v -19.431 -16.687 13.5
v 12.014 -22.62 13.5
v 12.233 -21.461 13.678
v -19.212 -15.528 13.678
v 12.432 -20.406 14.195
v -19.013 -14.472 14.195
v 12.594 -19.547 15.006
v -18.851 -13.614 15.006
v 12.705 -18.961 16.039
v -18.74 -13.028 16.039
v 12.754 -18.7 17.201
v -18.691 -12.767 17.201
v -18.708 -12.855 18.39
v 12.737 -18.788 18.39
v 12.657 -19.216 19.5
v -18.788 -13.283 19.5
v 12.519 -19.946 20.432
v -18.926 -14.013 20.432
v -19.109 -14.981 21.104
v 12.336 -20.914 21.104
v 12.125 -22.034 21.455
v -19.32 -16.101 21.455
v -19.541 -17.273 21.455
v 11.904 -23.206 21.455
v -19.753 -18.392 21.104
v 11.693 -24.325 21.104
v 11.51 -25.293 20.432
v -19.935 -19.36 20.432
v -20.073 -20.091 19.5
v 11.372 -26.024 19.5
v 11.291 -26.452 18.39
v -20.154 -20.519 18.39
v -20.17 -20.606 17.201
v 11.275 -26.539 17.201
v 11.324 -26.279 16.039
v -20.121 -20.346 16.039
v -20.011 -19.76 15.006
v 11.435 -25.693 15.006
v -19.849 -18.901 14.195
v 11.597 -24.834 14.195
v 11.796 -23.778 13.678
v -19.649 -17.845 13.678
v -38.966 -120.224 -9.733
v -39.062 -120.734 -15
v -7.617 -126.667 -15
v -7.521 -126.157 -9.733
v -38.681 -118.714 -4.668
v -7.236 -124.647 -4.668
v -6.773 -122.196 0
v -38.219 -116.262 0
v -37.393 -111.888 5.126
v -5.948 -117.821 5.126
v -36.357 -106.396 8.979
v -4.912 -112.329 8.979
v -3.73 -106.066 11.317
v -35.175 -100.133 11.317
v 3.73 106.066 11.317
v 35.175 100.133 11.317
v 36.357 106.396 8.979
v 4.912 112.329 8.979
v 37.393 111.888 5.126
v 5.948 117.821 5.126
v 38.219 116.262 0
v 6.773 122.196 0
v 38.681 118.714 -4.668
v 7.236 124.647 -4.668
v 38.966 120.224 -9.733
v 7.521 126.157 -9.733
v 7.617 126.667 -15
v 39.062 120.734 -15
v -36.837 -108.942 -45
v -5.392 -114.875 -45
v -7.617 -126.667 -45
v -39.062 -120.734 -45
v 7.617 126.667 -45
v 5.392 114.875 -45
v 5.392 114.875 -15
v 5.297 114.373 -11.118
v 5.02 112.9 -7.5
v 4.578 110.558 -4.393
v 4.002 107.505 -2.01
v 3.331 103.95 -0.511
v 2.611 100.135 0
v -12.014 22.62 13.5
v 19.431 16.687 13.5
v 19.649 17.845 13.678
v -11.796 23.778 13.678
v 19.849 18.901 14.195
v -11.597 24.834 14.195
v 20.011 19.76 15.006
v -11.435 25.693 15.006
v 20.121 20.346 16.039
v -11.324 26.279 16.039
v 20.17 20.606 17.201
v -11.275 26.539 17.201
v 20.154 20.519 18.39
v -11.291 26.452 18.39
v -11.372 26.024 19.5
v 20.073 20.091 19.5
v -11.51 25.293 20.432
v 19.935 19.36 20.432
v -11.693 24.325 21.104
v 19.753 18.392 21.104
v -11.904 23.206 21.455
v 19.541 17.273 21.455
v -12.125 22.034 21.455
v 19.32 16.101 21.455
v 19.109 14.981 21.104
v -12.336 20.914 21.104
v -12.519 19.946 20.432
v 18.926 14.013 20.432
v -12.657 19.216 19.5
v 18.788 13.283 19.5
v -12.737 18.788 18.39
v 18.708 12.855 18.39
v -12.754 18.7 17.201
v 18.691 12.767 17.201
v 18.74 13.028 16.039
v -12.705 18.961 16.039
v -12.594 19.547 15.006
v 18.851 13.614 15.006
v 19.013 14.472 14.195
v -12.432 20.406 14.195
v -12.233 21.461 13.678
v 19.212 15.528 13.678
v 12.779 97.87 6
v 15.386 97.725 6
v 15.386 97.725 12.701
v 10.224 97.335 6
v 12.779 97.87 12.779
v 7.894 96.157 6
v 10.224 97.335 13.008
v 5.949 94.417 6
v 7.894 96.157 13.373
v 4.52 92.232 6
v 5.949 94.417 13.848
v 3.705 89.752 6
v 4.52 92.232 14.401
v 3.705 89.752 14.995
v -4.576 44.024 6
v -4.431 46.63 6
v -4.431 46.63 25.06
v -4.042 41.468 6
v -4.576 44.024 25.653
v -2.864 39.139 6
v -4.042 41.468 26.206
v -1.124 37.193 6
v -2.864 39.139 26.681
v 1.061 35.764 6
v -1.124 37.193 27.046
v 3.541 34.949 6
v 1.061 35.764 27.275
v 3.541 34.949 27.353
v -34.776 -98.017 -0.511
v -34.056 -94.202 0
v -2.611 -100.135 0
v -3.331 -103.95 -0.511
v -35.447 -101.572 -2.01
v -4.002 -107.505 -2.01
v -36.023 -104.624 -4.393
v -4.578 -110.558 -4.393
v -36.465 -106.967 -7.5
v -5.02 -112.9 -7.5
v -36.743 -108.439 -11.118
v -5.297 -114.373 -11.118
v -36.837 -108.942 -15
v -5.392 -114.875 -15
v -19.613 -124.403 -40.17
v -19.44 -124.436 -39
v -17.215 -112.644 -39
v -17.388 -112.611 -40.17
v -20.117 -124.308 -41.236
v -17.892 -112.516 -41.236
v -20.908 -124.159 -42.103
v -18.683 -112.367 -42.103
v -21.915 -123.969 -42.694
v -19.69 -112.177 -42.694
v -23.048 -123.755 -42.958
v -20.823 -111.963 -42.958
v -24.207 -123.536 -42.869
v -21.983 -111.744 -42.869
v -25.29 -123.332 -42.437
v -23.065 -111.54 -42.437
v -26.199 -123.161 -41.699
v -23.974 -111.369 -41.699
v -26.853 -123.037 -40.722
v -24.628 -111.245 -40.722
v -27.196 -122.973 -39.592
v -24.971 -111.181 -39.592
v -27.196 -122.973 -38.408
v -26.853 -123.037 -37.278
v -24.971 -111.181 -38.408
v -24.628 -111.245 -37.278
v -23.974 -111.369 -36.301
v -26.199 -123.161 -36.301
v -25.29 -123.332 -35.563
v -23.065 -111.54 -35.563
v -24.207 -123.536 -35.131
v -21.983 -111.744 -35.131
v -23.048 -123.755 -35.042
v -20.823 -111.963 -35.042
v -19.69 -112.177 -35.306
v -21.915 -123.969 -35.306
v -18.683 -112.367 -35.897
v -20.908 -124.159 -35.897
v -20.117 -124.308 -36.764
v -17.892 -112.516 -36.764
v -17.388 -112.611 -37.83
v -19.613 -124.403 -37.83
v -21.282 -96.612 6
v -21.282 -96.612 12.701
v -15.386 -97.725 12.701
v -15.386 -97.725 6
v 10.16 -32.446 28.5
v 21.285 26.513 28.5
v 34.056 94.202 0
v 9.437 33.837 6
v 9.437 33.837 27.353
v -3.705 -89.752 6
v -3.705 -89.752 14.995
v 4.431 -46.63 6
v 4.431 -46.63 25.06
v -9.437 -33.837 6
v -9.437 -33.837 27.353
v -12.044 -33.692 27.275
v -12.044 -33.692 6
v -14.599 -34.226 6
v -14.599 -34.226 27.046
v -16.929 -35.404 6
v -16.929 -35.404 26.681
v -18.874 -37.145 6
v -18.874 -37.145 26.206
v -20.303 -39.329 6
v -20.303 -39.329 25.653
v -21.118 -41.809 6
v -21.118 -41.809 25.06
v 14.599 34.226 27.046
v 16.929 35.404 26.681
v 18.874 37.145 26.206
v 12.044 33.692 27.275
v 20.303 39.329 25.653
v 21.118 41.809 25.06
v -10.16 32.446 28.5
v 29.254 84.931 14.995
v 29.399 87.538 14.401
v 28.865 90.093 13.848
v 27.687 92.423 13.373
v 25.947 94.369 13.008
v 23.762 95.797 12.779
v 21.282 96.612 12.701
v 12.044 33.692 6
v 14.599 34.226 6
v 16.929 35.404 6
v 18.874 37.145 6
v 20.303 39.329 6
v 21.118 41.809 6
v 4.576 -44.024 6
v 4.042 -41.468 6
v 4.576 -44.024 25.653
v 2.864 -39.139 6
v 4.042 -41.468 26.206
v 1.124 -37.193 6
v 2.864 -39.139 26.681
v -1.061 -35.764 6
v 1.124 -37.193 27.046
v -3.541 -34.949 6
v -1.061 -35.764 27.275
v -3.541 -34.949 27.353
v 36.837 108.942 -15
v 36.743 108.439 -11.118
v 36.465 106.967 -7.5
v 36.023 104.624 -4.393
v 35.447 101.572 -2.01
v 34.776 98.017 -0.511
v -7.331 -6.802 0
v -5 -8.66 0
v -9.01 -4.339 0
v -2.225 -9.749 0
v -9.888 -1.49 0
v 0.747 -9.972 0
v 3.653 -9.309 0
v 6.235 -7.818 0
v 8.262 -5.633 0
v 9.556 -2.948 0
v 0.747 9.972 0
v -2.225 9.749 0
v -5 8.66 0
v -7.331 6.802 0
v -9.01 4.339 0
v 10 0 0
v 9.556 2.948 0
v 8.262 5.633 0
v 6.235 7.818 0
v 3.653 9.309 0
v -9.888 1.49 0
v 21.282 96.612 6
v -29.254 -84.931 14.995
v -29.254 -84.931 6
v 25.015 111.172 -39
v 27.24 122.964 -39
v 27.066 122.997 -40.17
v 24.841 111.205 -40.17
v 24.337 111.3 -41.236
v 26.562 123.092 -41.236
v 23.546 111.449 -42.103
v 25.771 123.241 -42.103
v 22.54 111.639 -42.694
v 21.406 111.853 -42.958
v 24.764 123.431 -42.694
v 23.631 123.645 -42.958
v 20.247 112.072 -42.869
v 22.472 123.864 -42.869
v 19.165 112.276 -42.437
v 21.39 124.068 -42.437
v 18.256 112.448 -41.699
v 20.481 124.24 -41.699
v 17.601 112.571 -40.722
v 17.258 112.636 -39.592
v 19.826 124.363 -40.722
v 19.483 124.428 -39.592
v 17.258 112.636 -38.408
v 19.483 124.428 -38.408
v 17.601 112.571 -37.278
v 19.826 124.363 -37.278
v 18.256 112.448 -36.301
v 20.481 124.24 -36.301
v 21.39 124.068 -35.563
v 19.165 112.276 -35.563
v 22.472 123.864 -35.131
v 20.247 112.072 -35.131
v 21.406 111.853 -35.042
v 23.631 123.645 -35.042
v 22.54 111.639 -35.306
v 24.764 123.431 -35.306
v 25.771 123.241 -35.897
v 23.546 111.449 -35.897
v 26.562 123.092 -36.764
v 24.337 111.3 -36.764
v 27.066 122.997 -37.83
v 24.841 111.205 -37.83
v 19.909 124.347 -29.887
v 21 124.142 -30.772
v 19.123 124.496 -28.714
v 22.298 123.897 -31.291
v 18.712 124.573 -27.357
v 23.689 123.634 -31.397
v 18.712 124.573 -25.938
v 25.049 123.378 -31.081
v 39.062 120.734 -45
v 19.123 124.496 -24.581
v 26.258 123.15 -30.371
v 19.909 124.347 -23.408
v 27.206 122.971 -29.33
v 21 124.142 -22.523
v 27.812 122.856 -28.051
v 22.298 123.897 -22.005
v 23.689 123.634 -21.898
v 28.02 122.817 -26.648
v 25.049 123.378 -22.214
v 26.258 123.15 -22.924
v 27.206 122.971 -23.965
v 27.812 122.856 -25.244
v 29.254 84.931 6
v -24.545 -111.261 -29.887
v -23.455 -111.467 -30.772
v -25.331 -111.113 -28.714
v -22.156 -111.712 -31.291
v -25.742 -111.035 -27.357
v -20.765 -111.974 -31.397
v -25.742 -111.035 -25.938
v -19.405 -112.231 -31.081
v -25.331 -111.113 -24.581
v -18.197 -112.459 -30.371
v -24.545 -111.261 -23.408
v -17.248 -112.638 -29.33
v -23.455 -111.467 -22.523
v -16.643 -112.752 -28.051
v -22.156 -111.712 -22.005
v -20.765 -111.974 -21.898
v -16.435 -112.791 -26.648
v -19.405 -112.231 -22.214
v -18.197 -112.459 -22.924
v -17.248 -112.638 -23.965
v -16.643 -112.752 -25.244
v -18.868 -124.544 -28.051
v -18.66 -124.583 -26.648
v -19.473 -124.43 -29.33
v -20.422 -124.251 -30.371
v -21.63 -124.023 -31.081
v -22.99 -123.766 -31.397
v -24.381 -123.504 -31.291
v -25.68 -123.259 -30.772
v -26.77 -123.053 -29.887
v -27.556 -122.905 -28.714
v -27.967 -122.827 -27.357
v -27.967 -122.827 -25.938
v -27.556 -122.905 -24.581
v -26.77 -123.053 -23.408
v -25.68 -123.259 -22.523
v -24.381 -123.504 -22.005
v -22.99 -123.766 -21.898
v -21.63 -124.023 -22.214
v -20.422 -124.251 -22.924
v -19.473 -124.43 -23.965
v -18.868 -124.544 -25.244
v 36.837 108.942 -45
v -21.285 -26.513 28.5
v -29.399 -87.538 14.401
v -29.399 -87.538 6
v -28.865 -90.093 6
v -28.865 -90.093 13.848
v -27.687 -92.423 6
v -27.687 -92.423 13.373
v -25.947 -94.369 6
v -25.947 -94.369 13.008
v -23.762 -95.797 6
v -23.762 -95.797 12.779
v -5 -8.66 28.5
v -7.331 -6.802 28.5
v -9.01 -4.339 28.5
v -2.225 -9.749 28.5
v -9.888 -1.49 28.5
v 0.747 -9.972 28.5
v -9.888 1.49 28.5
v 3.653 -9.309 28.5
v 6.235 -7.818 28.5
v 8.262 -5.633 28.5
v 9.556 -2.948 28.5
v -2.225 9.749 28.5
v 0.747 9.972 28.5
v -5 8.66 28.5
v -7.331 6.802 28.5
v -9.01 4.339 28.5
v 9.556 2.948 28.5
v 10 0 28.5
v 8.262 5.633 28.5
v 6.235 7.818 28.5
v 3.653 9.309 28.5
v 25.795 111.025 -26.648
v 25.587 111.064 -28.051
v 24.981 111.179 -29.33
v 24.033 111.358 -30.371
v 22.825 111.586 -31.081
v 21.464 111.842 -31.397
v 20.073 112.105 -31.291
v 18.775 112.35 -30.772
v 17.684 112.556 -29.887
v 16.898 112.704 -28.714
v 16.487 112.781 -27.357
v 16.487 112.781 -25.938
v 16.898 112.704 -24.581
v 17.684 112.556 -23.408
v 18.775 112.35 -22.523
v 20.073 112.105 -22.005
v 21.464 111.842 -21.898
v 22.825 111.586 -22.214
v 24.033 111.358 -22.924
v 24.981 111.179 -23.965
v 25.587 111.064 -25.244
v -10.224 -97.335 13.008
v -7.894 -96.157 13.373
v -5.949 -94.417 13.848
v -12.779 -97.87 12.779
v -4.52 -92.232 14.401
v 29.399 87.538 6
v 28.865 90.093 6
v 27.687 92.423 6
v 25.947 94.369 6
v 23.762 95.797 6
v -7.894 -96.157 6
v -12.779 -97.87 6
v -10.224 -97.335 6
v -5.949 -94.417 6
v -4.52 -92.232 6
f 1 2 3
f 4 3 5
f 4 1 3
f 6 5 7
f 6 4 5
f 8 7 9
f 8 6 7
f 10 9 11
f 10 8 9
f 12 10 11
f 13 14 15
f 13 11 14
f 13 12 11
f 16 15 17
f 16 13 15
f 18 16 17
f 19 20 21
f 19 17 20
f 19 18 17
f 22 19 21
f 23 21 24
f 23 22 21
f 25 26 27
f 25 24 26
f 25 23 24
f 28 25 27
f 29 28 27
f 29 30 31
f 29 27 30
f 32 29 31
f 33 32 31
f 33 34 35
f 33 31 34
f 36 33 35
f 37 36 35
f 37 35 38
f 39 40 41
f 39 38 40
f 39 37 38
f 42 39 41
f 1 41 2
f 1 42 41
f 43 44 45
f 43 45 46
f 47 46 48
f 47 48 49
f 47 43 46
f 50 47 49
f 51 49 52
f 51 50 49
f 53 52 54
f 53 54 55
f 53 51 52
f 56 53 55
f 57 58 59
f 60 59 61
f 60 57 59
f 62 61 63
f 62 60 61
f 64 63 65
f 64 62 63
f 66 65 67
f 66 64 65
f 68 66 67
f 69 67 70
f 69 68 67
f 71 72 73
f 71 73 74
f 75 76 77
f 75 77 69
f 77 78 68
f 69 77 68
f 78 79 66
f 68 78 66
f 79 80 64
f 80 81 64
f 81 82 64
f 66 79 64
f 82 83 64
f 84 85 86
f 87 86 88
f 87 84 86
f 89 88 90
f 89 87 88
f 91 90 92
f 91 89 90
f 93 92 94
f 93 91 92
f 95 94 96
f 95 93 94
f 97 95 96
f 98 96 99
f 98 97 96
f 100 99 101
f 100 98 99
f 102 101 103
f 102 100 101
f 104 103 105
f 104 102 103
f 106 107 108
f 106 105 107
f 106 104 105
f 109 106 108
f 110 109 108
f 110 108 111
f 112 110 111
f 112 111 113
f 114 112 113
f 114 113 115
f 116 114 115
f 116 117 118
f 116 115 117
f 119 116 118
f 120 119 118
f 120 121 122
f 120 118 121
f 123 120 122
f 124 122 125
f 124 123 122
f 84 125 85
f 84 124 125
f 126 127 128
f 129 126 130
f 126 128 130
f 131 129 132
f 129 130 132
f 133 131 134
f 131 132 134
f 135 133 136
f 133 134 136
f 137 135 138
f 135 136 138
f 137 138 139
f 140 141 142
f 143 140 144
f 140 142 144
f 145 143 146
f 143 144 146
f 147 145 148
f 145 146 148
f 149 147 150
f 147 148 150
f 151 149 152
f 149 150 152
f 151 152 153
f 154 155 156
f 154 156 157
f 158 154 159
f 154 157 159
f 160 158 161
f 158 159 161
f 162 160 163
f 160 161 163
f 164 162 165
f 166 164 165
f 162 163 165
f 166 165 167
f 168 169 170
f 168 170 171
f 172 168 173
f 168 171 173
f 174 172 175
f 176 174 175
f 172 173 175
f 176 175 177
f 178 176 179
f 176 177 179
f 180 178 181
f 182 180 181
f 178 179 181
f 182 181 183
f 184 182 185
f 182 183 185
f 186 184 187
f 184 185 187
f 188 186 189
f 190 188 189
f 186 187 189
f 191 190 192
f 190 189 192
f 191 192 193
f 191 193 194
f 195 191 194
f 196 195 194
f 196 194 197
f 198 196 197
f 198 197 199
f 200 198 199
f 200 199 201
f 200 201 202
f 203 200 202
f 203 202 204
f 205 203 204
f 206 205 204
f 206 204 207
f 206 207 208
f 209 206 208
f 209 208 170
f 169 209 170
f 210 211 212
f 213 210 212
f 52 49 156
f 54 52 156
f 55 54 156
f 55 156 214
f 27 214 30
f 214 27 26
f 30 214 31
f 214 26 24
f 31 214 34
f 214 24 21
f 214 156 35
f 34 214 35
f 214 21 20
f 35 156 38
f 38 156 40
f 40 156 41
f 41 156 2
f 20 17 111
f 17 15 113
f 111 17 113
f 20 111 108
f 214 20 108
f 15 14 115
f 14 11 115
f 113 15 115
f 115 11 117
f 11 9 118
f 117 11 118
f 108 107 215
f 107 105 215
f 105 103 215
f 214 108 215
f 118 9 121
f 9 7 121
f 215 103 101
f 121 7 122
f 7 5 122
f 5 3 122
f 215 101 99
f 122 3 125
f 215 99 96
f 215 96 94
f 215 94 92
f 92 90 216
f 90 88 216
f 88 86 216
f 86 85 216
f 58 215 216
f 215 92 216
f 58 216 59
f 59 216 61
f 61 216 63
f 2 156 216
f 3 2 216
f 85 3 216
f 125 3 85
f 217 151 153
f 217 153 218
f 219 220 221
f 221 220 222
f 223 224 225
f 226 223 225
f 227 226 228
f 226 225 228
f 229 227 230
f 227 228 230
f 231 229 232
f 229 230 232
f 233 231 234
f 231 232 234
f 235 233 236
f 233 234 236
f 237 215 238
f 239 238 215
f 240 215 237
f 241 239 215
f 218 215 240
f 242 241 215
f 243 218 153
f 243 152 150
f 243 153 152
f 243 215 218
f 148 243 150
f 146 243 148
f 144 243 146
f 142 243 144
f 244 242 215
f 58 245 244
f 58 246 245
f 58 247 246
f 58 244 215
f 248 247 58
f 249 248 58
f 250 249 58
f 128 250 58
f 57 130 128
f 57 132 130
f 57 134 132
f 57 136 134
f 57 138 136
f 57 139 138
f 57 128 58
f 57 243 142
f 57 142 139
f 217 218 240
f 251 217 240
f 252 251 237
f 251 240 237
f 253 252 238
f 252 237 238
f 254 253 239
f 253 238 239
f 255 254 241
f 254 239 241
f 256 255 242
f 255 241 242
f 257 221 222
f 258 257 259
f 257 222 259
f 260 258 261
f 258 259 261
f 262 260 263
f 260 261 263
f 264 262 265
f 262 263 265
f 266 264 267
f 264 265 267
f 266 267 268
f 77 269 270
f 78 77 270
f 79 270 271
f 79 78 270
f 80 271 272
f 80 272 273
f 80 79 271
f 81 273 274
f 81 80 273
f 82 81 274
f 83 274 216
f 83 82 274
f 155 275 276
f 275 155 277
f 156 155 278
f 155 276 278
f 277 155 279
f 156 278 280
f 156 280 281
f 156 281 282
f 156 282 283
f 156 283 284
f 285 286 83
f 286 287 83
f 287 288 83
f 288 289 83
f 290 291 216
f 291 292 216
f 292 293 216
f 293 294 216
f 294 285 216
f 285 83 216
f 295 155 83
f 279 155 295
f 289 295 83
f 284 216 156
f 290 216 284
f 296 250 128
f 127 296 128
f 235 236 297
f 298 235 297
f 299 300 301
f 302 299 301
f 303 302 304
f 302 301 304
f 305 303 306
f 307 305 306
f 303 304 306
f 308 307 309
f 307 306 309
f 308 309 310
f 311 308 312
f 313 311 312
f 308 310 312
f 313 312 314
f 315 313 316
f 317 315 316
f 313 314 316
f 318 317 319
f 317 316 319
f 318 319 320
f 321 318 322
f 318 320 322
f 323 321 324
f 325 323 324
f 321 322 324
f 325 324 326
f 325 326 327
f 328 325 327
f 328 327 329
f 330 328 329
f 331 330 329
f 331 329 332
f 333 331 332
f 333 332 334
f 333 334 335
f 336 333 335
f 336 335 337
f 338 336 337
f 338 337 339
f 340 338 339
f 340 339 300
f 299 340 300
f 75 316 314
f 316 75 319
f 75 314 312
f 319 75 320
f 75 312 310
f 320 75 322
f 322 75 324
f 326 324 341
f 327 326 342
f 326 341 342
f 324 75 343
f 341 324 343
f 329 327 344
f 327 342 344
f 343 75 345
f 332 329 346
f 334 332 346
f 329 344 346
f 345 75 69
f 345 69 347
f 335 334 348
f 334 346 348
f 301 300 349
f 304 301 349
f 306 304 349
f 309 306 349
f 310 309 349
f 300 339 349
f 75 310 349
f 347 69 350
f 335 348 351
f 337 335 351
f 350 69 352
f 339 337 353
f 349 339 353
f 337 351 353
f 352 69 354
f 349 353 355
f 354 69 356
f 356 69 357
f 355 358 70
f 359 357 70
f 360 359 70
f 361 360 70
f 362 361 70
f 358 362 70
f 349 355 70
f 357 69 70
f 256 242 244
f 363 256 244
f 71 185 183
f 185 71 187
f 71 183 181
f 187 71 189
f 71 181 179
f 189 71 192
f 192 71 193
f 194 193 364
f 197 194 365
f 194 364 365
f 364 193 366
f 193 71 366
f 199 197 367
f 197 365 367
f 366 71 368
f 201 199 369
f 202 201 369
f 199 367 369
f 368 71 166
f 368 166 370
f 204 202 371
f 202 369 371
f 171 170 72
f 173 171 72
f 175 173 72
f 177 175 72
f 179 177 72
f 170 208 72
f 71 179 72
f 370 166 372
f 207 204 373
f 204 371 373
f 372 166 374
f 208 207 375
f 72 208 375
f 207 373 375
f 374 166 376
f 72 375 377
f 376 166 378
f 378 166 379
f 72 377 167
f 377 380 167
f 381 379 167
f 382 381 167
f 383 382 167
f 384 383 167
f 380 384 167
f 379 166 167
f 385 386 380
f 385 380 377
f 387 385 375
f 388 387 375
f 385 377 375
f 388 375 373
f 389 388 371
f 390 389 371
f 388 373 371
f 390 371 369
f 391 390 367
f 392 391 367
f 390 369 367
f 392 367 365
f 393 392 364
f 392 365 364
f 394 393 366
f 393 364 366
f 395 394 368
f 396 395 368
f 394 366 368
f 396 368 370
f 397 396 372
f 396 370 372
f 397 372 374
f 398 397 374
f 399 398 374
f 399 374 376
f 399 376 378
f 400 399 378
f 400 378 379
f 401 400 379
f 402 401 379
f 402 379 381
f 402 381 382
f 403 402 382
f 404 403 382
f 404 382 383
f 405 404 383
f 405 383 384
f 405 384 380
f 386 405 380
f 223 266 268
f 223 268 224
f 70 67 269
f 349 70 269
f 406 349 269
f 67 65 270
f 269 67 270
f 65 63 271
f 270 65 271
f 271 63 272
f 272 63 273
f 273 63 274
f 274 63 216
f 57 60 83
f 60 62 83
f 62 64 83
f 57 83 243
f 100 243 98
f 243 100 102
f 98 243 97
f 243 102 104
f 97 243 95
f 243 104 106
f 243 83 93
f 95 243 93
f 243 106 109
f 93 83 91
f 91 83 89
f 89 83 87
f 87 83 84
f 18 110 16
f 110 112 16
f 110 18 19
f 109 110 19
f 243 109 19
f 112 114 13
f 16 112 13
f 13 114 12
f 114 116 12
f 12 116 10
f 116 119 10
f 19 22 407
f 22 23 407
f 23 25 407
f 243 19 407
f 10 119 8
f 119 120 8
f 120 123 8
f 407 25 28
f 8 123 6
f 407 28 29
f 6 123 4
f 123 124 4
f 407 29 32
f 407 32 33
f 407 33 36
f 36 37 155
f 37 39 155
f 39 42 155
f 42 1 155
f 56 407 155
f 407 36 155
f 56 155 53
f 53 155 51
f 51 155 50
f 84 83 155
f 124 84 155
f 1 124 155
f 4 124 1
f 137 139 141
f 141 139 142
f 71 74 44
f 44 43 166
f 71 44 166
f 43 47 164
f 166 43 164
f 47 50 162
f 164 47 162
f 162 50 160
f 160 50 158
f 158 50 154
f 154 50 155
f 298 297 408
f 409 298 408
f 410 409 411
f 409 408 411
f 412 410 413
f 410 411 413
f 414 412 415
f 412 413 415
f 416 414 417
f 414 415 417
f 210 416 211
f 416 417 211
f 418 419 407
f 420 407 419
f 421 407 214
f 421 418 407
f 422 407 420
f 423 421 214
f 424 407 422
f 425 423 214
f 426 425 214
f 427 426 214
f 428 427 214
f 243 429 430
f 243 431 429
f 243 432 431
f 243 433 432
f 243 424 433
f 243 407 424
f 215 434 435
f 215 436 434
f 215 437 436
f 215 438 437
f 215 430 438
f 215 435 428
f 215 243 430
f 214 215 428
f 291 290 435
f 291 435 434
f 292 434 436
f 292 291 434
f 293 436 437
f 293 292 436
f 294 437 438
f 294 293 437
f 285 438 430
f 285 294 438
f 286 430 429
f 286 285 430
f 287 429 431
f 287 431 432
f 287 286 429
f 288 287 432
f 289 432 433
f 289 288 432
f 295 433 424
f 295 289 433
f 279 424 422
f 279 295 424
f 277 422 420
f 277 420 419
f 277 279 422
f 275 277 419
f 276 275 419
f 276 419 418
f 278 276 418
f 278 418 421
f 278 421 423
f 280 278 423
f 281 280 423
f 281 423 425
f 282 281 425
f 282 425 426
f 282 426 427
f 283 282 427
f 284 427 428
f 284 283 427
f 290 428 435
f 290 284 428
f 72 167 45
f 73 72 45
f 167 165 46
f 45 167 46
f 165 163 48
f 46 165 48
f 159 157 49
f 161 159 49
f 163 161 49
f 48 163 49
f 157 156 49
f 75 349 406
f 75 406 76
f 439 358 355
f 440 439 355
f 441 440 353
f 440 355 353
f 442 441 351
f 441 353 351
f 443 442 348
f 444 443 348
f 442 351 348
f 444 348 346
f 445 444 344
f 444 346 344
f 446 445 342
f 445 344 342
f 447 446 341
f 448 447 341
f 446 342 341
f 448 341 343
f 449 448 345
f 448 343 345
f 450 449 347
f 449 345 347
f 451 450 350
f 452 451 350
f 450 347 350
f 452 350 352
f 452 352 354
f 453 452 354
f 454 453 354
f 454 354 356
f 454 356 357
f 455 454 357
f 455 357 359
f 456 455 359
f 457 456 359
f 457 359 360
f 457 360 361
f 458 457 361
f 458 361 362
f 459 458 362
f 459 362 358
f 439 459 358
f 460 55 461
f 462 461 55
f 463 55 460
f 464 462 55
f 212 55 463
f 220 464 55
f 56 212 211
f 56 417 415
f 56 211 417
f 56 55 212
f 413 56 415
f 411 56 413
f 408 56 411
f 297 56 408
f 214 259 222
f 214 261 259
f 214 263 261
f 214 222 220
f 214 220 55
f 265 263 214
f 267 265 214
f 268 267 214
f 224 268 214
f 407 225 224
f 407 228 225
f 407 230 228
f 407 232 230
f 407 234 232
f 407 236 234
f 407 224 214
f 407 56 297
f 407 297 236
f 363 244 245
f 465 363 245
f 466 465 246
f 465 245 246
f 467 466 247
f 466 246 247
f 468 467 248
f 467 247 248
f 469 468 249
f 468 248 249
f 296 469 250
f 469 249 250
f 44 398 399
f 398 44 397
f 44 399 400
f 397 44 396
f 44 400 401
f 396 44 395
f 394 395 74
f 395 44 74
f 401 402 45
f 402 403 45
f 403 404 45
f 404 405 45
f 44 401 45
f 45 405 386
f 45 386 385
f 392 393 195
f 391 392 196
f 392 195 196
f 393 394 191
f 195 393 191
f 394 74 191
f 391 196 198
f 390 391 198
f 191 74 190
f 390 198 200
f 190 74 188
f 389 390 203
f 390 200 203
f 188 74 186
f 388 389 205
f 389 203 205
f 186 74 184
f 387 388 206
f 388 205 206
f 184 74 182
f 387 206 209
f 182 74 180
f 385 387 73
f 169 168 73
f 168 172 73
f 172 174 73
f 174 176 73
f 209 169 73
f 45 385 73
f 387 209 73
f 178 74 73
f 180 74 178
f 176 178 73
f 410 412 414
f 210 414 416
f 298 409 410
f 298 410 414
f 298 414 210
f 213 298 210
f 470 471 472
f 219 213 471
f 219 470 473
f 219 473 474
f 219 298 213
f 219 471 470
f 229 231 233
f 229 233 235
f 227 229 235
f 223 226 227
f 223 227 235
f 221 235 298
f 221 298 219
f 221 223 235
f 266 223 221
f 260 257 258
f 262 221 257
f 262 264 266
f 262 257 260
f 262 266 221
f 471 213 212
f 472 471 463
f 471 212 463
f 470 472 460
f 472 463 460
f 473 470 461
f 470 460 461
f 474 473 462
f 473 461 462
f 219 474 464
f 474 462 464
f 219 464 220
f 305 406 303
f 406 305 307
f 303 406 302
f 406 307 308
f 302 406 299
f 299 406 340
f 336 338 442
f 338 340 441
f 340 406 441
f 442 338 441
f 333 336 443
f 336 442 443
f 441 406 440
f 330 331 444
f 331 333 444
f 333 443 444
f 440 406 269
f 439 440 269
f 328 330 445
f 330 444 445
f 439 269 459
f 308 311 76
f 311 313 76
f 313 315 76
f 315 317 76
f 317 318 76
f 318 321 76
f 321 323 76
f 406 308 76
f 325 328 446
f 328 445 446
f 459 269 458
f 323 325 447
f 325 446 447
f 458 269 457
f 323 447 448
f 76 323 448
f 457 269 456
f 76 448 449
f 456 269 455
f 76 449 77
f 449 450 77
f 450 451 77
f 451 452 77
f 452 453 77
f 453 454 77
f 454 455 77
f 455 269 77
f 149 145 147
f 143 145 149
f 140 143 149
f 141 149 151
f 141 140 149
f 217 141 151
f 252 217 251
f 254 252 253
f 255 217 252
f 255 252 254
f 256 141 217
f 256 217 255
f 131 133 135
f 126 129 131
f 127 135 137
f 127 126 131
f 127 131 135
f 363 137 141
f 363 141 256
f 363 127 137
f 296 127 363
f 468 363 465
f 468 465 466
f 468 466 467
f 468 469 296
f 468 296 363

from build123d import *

# Parameters (mm, degrees)
SKETCH1_R               = 10
BOSS_EXTRUDE1_DEPTH     = 28.5
BOSS_EXTRUDE2_DEPTH     = 45
SKETCH4_R               = 4.7625
SKETCH4_R_2             = 3.96875
CUT_EXTRUDE1_DEPTH      = 258.595725096
FILLET3_R               = 15
SKETCH10_R              = 4
CUT_EXTRUDE2_DEPTH      = 78.869968284
CUT_EXTRUDE2_DEPTH_BACK = 46.869968284
CUT_EXTRUDE4_DEPTH      = 22.5


with BuildPart() as part:
    # Sketch1 → Boss-Extrude1 (new body)
    with BuildSketch(Plane.XY):
        Polygon((-7.617068705, -126.66669812), (39.062241625, 120.733646626), (7.617068705, 126.66669812), (-39.062241625, -120.733646626), align=None)
        Circle(SKETCH1_R, mode=Mode.SUBTRACT)
    extrude(amount=BOSS_EXTRUDE1_DEPTH)

    # Sketch2 → Boss-Extrude2 (add)
    with BuildSketch(Plane(origin=(0, 0, 0), x_dir=(-1, 0, 0), z_dir=(0, 0, -1))):
        Polygon((-39.062241625, 120.733646626), (-36.837347314, 108.941706781), (-5.392174394, 114.874758275), (-7.617068705, 126.66669812), align=None)
        Polygon((36.837347314, -108.941706781), (5.392174394, -114.874758275), (7.617068705, -126.66669812), (39.062241625, -120.733646626), align=None)
    extrude(amount=BOSS_EXTRUDE2_DEPTH)

    # Sketch4 → Cut-Extrude1 (cut, through all)
    with BuildSketch(Plane(origin=(-1.656161502, 128.416364197, 0), x_dir=(0.982661654, -0.185407859, 0), z_dir=(0.185407859, 0.982661654, 0))):
        with Locations((25.436849572, 26.64759704)):
            Circle(SKETCH4_R)
        with Locations((25.436849572, 39)):
            Circle(SKETCH4_R_2)
    extrude(amount=-CUT_EXTRUDE1_DEPTH, mode=Mode.SUBTRACT)

    # Fillet3
    fillet3_edges = [part.edges().sort_by_distance(p)[0] for p in [
        (21.114760854, 111.908232528, 0),
        (-21.114760854, -111.908232528, 0),
    ]]
    fillet(fillet3_edges, radius=FILLET3_R)

    # Sketch10 → Cut-Extrude2 (cut, two sides)
    with BuildSketch(Plane(origin=(-16.024269994, 1.367603019, 0), x_dir=(0, 0, -1), z_dir=(0.982661654, -0.185407859, 0))) as cut_extrude2_sk:
        with Locations((-17.5, 21.627134551)):
            Circle(SKETCH10_R)
        with Locations((-17.5, -18.372865449)):
            Circle(SKETCH10_R)
        with BuildLine():
            Line((-28.5, 31.627134551), (-11.316666773, 106.545885621))
            ThreePointArc((-11.316666773, 106.545885621), (-1.82302812, 121.628280107), (15, 127.509906002))
            Line((15, 127.509906002), (-44.768549469, 140.171550448))
            Line((-44.768549469, 140.171550448), (-46.912682998, 31.416920937))
            Line((-46.912682998, 31.416920937), (-28.5, 31.627134551))
        make_face()
        with BuildLine():
            Line((-44.768549469, -136.917281346), (15, -124.255636901))
            ThreePointArc((15, -124.255636901), (-1.82302812, -118.374011006), (-11.316666773, -103.29161652))
            Line((-11.316666773, -103.29161652), (-28.5, -28.372865449))
            Line((-28.5, -28.372865449), (-46.912682998, -28.162651835))
            Line((-46.912682998, -28.162651835), (-44.768549469, -136.917281346))
        make_face()
    extrude(amount=CUT_EXTRUDE2_DEPTH, mode=Mode.SUBTRACT)
    extrude(cut_extrude2_sk.sketch, amount=-CUT_EXTRUDE2_DEPTH_BACK, mode=Mode.SUBTRACT)

    # Sketch11 → Cut-Extrude4 (cut)
    with BuildSketch(Plane.XY.offset(28.5)):
        with BuildLine():
            Line((3.541290111, 34.949381459), (9.437260033, 33.836934304))
            ThreePointArc((9.437260033, 33.836934304), (16.92877427, 35.404052106), (21.117955163, 41.809472249))
            Line((21.117955163, 41.809472249), (29.254165873, 84.931389014))
            ThreePointArc((29.254165873, 84.931389014), (27.687048071, 92.422903251), (21.281627928, 96.612084144))
            Line((21.281627928, 96.612084144), (15.385658005, 97.724531299))
            ThreePointArc((15.385658005, 97.724531299), (7.894143769, 96.157413497), (3.704962876, 89.751993354))
            Line((3.704962876, 89.751993354), (-4.431247835, 46.630076588))
            ThreePointArc((-4.431247835, 46.630076588), (-2.864130032, 39.138562352), (3.541290111, 34.949381459))
        make_face()
        with BuildLine():
            Line((-21.281627928, -96.612084144), (-15.385658005, -97.724531299))
            ThreePointArc((-15.385658005, -97.724531299), (-7.894143769, -96.157413497), (-3.704962876, -89.751993354))
            Line((-3.704962876, -89.751993354), (4.431247835, -46.630076588))
            ThreePointArc((4.431247835, -46.630076588), (2.864130032, -39.138562352), (-3.541290111, -34.949381459))
            Line((-3.541290111, -34.949381459), (-9.437260033, -33.836934304))
            ThreePointArc((-9.437260033, -33.836934304), (-16.92877427, -35.404052106), (-21.117955163, -41.809472249))
            Line((-21.117955163, -41.809472249), (-29.254165873, -84.931389014))
            ThreePointArc((-29.254165873, -84.931389014), (-27.687048071, -92.422903251), (-21.281627928, -96.612084144))
        make_face()
    extrude(amount=-CUT_EXTRUDE4_DEPTH, mode=Mode.SUBTRACT)


solid = part.part
